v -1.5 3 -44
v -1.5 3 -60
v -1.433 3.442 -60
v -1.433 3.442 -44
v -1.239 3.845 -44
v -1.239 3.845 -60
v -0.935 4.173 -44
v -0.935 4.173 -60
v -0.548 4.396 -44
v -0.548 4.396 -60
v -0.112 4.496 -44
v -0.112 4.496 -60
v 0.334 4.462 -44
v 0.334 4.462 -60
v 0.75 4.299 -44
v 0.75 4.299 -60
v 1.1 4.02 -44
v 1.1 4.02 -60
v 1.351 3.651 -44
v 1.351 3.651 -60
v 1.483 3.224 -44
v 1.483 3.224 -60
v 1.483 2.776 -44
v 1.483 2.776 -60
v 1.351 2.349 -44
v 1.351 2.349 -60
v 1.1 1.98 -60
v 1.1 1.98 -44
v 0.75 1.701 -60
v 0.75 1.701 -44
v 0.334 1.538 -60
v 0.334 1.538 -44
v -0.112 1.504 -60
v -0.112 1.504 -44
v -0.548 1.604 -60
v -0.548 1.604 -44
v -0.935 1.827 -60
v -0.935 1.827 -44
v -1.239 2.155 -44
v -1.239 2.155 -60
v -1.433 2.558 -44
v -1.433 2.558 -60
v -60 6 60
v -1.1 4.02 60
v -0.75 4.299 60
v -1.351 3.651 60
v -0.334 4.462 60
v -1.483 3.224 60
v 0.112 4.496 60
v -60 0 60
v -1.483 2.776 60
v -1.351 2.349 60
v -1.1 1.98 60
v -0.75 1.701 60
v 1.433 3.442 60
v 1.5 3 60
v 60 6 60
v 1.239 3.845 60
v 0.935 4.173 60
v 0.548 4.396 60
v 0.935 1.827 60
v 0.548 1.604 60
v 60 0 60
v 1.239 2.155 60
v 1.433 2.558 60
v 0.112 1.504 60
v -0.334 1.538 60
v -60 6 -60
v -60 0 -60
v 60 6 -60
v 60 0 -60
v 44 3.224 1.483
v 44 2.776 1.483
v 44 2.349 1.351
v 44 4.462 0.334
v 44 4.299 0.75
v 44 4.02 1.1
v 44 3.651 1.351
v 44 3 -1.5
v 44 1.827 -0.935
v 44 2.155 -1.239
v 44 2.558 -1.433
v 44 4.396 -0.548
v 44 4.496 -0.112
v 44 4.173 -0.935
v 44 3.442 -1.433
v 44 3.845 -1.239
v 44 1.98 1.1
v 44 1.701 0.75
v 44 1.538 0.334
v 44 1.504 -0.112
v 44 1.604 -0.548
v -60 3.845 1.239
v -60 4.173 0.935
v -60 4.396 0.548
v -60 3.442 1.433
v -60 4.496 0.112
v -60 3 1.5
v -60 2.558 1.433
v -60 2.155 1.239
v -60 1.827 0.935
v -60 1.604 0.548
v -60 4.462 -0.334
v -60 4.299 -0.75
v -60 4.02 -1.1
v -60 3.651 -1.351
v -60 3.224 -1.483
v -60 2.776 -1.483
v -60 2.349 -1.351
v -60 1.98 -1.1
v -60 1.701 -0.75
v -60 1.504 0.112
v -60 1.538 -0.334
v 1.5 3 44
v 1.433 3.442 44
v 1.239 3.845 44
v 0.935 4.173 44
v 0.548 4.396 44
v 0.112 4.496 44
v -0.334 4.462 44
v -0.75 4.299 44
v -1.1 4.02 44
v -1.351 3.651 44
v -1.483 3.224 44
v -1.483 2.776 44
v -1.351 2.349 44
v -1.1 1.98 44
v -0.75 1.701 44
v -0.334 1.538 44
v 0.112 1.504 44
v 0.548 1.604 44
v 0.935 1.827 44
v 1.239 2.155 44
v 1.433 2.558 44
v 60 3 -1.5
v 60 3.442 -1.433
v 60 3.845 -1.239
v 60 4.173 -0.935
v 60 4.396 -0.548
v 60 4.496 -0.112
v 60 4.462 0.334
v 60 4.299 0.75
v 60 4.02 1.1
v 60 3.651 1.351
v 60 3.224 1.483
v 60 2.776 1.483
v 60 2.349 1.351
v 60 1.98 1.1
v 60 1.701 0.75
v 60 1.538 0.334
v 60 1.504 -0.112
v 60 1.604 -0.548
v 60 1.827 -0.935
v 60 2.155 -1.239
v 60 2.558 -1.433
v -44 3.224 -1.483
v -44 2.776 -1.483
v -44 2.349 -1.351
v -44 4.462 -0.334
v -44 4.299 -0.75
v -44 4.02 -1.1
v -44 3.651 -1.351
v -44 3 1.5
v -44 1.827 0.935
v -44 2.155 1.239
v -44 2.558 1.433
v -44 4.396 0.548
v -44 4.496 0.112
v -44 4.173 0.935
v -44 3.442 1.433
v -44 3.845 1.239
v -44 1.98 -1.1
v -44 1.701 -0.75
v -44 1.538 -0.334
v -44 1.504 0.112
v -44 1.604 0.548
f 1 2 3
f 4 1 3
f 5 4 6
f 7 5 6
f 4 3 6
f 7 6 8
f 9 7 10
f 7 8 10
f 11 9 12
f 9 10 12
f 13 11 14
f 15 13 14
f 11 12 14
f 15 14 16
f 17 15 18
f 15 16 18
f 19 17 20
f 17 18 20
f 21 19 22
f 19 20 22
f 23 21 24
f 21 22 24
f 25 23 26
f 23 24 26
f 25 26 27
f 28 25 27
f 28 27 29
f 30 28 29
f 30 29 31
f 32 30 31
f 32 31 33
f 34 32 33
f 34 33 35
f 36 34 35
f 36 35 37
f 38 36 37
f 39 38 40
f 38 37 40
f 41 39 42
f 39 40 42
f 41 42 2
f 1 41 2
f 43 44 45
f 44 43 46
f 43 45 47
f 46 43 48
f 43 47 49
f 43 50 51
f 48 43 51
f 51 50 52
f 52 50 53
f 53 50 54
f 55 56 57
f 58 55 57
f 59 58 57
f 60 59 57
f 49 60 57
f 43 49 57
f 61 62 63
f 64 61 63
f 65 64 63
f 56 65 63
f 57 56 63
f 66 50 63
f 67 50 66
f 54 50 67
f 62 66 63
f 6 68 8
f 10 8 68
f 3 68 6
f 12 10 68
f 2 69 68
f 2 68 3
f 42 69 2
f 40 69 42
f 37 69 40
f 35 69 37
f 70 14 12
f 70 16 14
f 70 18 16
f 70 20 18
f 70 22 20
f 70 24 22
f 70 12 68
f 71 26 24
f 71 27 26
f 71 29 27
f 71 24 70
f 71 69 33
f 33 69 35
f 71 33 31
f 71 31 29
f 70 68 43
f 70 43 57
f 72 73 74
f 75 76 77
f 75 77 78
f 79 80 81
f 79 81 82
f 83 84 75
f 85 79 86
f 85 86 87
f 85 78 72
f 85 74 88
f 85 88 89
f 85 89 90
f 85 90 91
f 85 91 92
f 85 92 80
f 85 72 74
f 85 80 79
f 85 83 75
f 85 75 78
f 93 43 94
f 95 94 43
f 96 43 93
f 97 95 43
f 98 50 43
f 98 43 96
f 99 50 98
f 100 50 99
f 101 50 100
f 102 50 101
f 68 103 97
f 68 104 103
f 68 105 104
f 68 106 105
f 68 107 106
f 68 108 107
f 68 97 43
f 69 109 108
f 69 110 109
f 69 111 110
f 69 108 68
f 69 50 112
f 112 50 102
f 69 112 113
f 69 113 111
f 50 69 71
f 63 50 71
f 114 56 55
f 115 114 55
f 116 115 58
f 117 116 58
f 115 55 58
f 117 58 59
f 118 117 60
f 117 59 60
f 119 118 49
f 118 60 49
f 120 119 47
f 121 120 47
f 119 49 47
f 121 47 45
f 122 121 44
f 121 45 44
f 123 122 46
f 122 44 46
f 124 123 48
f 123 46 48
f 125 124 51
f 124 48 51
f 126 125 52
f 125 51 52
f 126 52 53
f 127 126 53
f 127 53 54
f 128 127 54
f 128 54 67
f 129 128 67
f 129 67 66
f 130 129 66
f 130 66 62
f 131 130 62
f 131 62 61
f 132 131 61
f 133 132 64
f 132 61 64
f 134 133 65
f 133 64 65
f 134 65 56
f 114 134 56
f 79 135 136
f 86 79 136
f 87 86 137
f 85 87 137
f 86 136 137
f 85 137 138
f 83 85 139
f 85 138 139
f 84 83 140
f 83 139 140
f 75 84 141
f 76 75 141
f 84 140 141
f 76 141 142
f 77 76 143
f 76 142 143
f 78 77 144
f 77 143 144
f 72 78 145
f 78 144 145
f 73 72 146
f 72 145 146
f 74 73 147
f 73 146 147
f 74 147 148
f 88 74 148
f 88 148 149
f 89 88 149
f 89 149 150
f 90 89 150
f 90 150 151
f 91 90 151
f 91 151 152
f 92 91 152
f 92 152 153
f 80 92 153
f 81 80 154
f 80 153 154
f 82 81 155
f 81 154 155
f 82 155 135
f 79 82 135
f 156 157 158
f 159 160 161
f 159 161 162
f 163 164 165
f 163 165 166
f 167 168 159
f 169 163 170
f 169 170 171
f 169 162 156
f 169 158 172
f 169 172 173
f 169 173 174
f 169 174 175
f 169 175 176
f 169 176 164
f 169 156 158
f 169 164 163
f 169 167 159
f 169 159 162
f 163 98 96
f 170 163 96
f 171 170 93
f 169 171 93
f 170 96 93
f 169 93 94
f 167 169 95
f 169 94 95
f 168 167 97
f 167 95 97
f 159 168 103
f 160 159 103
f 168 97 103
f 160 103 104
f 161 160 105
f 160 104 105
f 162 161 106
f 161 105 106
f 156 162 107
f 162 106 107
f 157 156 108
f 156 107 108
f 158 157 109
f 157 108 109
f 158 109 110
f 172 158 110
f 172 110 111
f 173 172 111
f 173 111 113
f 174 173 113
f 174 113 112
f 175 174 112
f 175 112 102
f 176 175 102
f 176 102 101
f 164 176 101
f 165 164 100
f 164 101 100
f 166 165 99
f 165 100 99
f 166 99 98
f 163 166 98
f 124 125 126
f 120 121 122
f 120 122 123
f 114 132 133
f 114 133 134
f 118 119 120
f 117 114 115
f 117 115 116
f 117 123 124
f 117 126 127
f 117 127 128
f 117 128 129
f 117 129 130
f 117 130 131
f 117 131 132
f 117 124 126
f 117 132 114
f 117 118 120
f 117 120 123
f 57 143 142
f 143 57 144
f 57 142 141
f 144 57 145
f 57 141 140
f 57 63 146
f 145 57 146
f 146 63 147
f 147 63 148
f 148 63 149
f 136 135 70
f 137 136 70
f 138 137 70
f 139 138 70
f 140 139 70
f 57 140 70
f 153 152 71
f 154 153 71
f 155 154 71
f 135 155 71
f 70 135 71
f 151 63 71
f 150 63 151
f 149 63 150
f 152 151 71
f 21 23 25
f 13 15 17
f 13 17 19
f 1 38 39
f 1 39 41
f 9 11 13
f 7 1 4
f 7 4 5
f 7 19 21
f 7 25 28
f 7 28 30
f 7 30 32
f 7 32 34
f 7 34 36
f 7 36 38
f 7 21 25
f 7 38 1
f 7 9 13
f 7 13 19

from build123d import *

# Parameters (mm, degrees)
SKETCH_1_W          = 120
SKETCH_1_H          = 120
EXTRUDE_1_DEPTH     = 6
SKETCH_2_R          = 1.5
CUT_EXTRUDE_1_DEPTH = 16
SKETCH_3_R          = 1.5
CUT_EXTRUDE_4_DEPTH = 16
SKETCH_4_R          = 1.5
CUT_EXTRUDE_5_DEPTH = 16
SKETCH_5_R          = 1.5
CUT_EXTRUDE_6_DEPTH = 16


with BuildPart() as part:
    # 草图1 → 凸台-拉伸1 (new body)
    with BuildSketch(Plane(origin=(0, 0, 0), x_dir=(1, 0, 0), z_dir=(0, 1, 0))):
        Rectangle(SKETCH_1_W, SKETCH_1_H)
    extrude(amount=EXTRUDE_1_DEPTH)

    # 草图2 → 切除-拉伸1 (cut)
    with BuildSketch(Plane(origin=(60, 0, 0), x_dir=(0, 0, -1), z_dir=(1, 0, 0))):
        with Locations((0, 3)):
            Circle(SKETCH_2_R)
    extrude(amount=-CUT_EXTRUDE_1_DEPTH, mode=Mode.SUBTRACT)

    # 草图3 → 切除-拉伸4 (cut)
    with BuildSketch(Plane(origin=(0, 0, -60), x_dir=(-1, 0, 0), z_dir=(0, 0, -1))):
        with Locations((0, 3)):
            Circle(SKETCH_3_R)
    extrude(amount=-CUT_EXTRUDE_4_DEPTH, mode=Mode.SUBTRACT)

    # 草图4 → 切除-拉伸5 (cut)
    with BuildSketch(Plane.ZY.offset(60)):
        with Locations((0, 3)):
            Circle(SKETCH_4_R)
    extrude(amount=-CUT_EXTRUDE_5_DEPTH, mode=Mode.SUBTRACT)

    # 草图5 → 切除-拉伸6 (cut)
    with BuildSketch(Plane.XY.offset(60)):
        with Locations((0, 3)):
            Circle(SKETCH_5_R)
    extrude(amount=-CUT_EXTRUDE_6_DEPTH, mode=Mode.SUBTRACT)


solid = part.part
